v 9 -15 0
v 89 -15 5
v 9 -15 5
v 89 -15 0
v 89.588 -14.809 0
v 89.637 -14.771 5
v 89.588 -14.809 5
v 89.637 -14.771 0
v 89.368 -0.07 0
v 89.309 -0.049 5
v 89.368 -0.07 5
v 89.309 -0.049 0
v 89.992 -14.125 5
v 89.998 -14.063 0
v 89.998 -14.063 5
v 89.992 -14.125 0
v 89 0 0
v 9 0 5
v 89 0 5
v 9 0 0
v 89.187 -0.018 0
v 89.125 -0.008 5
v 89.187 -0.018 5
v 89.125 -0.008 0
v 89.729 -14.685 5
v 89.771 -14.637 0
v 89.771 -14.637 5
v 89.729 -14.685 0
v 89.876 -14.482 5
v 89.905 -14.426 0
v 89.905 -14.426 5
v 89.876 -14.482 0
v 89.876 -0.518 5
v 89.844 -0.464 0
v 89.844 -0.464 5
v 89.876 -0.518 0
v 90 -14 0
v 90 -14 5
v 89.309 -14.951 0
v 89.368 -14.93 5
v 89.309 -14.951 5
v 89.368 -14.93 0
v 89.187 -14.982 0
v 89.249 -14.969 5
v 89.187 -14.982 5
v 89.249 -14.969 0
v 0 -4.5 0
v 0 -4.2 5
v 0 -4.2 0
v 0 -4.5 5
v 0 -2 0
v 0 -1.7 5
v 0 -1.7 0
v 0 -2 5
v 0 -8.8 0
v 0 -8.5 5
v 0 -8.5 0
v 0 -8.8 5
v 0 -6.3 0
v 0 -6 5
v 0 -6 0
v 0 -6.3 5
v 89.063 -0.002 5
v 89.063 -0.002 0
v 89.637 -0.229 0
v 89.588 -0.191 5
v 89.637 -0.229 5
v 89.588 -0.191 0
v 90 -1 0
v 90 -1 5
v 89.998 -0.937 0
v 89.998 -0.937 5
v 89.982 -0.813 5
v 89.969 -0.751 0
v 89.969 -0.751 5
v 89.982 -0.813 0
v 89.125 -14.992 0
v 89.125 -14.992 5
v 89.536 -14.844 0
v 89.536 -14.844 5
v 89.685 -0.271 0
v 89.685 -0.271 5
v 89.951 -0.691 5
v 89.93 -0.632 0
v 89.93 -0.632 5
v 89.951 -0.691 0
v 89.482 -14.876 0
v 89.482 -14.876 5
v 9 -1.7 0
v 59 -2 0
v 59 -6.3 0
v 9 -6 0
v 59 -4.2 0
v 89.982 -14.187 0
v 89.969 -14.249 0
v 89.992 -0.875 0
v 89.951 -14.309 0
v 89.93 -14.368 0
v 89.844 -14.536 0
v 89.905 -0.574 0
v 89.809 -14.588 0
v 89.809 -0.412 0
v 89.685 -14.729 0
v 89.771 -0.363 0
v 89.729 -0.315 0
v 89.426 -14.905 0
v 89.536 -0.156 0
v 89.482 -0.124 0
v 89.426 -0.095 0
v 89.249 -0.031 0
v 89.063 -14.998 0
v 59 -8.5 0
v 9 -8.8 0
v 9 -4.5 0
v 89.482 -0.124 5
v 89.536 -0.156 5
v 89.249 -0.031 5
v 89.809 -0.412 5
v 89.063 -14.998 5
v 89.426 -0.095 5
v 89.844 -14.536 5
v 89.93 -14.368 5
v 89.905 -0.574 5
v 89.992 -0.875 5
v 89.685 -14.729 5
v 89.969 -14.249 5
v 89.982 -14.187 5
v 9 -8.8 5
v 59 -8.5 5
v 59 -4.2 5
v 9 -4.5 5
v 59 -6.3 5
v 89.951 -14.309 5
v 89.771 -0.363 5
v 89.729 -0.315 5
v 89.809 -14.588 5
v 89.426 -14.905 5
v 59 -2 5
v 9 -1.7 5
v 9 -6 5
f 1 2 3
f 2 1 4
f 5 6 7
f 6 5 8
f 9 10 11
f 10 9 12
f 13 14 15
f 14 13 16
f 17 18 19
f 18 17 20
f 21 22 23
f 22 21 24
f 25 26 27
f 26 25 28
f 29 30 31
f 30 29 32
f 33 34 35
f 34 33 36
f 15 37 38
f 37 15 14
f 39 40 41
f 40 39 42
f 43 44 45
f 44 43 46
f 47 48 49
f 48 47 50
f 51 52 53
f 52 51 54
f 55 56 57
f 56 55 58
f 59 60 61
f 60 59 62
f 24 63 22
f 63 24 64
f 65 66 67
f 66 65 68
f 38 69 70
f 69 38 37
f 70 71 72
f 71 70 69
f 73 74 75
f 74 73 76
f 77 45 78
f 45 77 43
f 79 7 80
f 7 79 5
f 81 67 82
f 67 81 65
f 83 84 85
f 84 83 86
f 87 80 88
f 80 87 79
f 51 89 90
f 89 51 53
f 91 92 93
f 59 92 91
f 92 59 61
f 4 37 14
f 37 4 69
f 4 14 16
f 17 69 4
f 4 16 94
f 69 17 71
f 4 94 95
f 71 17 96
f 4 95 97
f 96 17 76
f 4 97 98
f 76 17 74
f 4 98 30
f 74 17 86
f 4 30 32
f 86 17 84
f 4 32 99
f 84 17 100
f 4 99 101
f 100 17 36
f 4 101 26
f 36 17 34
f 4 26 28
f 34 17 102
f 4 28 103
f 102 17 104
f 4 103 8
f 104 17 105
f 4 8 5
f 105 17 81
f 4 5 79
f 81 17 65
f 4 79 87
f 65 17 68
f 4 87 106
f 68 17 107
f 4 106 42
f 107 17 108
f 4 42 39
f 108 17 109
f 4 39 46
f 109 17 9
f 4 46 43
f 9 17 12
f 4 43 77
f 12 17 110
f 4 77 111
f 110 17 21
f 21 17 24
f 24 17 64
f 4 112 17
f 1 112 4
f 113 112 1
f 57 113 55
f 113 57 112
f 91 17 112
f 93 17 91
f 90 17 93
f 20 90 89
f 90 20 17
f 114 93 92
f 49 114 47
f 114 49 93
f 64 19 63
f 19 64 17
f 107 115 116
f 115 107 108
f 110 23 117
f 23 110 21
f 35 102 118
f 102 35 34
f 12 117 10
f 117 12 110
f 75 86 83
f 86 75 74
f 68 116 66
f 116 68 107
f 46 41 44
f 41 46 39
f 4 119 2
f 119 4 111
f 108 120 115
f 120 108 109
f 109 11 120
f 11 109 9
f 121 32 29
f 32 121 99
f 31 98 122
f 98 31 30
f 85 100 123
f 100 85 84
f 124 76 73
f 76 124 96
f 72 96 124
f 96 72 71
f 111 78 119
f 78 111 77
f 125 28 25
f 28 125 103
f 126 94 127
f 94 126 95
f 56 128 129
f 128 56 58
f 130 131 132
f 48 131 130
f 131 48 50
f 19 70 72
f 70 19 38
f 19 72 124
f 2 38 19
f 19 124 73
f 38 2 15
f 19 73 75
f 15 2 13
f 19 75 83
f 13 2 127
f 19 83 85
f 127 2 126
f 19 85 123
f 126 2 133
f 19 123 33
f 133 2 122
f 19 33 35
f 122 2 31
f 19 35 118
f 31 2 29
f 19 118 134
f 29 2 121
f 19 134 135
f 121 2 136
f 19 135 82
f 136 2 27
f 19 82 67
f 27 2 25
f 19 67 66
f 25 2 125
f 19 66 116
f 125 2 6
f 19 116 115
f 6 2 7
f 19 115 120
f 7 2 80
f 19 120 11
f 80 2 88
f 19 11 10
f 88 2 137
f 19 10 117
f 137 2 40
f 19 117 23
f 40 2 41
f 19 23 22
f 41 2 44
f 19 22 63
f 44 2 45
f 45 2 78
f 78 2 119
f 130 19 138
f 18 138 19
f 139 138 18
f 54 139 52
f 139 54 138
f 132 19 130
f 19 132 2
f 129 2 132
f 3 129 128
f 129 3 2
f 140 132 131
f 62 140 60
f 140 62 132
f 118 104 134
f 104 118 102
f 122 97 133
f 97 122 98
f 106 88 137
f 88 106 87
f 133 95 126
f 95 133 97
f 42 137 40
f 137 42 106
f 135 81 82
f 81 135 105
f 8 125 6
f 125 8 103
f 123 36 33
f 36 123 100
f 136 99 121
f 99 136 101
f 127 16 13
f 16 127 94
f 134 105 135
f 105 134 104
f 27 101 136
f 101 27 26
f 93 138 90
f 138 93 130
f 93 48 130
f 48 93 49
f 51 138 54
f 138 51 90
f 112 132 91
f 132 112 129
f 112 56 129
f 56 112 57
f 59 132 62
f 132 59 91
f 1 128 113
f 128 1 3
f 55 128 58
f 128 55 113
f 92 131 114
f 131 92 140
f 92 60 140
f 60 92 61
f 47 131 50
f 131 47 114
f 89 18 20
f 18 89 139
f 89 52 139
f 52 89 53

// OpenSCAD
// file: common.scad
// This work is licensed under a Creative Commons Attribution-ShareAlike 4.0 International License (http://creativecommons.org/licenses/by-sa/4.0/)

module xmove(dist) { translate([dist, 0, 0]) children(); }
module ymove(dist) { translate([0, dist, 0]) children(); }
module zmove(dist) { translate([0, 0, dist]) children(); }
module xrot(angle) { rotate([angle, 0, 0]) children(); }
module yrot(angle) { rotate([0, angle, 0]) children(); }
module zrot(angle) { rotate([0, 0, angle]) children(); }

module round_cube(dimensions, radius, center=false) {
    if (center) {
        translate([0, 0, -0.5]) _round_cube(dimensions, radius, center);
    } else {
        translate([radius, radius, 0]) _round_cube(dimensions, radius);
    }
}

module _round_cube(dimensions, radius, center=false) {
        minkowski() {
            cube([dimensions[0] - radius*2, dimensions[1] - radius*2, dimensions[2] - 1], center=center);
            cylinder(r=radius,h=1);
        }
}


module hollow_cylinder_thick(height, outer_radius, thickness) {
    difference() {
        cylinder(h=height, r=outer_radius, center=true);
        cylinder(h=height + 0.02, r=outer_radius - thickness, center=true);
    }
}

module hollow_cylinder(height, externalDiameter, internalDiameter) {
    difference() {
        cylinder(height, r=externalDiameter/2);
        translate([0, 0, -1]) cylinder(height + 2, r=internalDiameter/2);
    }
}

module screw_hole(screwDiameter, headDiameter, depth, headDepth) {    
    translate([0, 0, -depth]) cylinder(h=4 * depth, r=screwDiameter / 2);
    translate([0, 0, depth - headDepth]) cylinder(h=4 * depth, r=headDiameter / 2);
}

module cylinder_sector(diameter, startAngle, endAngle) {
    cylinder(h=height, d=diameter);
}


$fn=100;
size=10;
distance=0;

round_cube(dimensions=[10,10,3], radius=3);
!round_cube(dimensions=[10,10,3], radius=3, center=true);
hollow_cylinder(height=3, externalDiameter=10, internalDiameter=7);
difference() { cube([10, 10, 3]); translate([5, 5, 0]) screw_hole(screwDiameter=3, headDiameter=6, depth=3, headDepth=1); }
cylinder_sector(height=3, diameter=10, startAngle=0, endAngle=180);
// main file
use <common.scad>

platter_height = 2.2;
platter_radius = 60;
x_size = platter_radius + 30;
z_size = 5;
y_size = 15;
top_platter_z = 6.3;
bottom_platter_z = 2;
support_height = 0.3; // 0.41
support_length = 10;

rotate([90, 0, 0]) {

difference() {
    translate([0, z_size, 0]) rotate([90, 0, 0]) round_cube([x_size, y_size, z_size], 1, false);
    
    translate([-1, -1, bottom_platter_z]) cube([platter_radius, y_size + 2, platter_height]);
    translate([-1, -1, top_platter_z]) cube([platter_radius, y_size + 2, platter_height]);
    
    translate([-1, -1, top_platter_z + platter_height + support_height]) {
        cube([support_length, y_size + 2,  y_size]);
    }
    translate([-1, -1, bottom_platter_z + platter_height + support_height]) {
        cube([support_length, y_size + 2, top_platter_z - bottom_platter_z - platter_height - 2 * support_height]);
    }
    translate([-1, -1, -0.1]) {
        cube([support_length, y_size + 2, bottom_platter_z - /* 2 * */ support_height + 0.1]);
    }
}

}
